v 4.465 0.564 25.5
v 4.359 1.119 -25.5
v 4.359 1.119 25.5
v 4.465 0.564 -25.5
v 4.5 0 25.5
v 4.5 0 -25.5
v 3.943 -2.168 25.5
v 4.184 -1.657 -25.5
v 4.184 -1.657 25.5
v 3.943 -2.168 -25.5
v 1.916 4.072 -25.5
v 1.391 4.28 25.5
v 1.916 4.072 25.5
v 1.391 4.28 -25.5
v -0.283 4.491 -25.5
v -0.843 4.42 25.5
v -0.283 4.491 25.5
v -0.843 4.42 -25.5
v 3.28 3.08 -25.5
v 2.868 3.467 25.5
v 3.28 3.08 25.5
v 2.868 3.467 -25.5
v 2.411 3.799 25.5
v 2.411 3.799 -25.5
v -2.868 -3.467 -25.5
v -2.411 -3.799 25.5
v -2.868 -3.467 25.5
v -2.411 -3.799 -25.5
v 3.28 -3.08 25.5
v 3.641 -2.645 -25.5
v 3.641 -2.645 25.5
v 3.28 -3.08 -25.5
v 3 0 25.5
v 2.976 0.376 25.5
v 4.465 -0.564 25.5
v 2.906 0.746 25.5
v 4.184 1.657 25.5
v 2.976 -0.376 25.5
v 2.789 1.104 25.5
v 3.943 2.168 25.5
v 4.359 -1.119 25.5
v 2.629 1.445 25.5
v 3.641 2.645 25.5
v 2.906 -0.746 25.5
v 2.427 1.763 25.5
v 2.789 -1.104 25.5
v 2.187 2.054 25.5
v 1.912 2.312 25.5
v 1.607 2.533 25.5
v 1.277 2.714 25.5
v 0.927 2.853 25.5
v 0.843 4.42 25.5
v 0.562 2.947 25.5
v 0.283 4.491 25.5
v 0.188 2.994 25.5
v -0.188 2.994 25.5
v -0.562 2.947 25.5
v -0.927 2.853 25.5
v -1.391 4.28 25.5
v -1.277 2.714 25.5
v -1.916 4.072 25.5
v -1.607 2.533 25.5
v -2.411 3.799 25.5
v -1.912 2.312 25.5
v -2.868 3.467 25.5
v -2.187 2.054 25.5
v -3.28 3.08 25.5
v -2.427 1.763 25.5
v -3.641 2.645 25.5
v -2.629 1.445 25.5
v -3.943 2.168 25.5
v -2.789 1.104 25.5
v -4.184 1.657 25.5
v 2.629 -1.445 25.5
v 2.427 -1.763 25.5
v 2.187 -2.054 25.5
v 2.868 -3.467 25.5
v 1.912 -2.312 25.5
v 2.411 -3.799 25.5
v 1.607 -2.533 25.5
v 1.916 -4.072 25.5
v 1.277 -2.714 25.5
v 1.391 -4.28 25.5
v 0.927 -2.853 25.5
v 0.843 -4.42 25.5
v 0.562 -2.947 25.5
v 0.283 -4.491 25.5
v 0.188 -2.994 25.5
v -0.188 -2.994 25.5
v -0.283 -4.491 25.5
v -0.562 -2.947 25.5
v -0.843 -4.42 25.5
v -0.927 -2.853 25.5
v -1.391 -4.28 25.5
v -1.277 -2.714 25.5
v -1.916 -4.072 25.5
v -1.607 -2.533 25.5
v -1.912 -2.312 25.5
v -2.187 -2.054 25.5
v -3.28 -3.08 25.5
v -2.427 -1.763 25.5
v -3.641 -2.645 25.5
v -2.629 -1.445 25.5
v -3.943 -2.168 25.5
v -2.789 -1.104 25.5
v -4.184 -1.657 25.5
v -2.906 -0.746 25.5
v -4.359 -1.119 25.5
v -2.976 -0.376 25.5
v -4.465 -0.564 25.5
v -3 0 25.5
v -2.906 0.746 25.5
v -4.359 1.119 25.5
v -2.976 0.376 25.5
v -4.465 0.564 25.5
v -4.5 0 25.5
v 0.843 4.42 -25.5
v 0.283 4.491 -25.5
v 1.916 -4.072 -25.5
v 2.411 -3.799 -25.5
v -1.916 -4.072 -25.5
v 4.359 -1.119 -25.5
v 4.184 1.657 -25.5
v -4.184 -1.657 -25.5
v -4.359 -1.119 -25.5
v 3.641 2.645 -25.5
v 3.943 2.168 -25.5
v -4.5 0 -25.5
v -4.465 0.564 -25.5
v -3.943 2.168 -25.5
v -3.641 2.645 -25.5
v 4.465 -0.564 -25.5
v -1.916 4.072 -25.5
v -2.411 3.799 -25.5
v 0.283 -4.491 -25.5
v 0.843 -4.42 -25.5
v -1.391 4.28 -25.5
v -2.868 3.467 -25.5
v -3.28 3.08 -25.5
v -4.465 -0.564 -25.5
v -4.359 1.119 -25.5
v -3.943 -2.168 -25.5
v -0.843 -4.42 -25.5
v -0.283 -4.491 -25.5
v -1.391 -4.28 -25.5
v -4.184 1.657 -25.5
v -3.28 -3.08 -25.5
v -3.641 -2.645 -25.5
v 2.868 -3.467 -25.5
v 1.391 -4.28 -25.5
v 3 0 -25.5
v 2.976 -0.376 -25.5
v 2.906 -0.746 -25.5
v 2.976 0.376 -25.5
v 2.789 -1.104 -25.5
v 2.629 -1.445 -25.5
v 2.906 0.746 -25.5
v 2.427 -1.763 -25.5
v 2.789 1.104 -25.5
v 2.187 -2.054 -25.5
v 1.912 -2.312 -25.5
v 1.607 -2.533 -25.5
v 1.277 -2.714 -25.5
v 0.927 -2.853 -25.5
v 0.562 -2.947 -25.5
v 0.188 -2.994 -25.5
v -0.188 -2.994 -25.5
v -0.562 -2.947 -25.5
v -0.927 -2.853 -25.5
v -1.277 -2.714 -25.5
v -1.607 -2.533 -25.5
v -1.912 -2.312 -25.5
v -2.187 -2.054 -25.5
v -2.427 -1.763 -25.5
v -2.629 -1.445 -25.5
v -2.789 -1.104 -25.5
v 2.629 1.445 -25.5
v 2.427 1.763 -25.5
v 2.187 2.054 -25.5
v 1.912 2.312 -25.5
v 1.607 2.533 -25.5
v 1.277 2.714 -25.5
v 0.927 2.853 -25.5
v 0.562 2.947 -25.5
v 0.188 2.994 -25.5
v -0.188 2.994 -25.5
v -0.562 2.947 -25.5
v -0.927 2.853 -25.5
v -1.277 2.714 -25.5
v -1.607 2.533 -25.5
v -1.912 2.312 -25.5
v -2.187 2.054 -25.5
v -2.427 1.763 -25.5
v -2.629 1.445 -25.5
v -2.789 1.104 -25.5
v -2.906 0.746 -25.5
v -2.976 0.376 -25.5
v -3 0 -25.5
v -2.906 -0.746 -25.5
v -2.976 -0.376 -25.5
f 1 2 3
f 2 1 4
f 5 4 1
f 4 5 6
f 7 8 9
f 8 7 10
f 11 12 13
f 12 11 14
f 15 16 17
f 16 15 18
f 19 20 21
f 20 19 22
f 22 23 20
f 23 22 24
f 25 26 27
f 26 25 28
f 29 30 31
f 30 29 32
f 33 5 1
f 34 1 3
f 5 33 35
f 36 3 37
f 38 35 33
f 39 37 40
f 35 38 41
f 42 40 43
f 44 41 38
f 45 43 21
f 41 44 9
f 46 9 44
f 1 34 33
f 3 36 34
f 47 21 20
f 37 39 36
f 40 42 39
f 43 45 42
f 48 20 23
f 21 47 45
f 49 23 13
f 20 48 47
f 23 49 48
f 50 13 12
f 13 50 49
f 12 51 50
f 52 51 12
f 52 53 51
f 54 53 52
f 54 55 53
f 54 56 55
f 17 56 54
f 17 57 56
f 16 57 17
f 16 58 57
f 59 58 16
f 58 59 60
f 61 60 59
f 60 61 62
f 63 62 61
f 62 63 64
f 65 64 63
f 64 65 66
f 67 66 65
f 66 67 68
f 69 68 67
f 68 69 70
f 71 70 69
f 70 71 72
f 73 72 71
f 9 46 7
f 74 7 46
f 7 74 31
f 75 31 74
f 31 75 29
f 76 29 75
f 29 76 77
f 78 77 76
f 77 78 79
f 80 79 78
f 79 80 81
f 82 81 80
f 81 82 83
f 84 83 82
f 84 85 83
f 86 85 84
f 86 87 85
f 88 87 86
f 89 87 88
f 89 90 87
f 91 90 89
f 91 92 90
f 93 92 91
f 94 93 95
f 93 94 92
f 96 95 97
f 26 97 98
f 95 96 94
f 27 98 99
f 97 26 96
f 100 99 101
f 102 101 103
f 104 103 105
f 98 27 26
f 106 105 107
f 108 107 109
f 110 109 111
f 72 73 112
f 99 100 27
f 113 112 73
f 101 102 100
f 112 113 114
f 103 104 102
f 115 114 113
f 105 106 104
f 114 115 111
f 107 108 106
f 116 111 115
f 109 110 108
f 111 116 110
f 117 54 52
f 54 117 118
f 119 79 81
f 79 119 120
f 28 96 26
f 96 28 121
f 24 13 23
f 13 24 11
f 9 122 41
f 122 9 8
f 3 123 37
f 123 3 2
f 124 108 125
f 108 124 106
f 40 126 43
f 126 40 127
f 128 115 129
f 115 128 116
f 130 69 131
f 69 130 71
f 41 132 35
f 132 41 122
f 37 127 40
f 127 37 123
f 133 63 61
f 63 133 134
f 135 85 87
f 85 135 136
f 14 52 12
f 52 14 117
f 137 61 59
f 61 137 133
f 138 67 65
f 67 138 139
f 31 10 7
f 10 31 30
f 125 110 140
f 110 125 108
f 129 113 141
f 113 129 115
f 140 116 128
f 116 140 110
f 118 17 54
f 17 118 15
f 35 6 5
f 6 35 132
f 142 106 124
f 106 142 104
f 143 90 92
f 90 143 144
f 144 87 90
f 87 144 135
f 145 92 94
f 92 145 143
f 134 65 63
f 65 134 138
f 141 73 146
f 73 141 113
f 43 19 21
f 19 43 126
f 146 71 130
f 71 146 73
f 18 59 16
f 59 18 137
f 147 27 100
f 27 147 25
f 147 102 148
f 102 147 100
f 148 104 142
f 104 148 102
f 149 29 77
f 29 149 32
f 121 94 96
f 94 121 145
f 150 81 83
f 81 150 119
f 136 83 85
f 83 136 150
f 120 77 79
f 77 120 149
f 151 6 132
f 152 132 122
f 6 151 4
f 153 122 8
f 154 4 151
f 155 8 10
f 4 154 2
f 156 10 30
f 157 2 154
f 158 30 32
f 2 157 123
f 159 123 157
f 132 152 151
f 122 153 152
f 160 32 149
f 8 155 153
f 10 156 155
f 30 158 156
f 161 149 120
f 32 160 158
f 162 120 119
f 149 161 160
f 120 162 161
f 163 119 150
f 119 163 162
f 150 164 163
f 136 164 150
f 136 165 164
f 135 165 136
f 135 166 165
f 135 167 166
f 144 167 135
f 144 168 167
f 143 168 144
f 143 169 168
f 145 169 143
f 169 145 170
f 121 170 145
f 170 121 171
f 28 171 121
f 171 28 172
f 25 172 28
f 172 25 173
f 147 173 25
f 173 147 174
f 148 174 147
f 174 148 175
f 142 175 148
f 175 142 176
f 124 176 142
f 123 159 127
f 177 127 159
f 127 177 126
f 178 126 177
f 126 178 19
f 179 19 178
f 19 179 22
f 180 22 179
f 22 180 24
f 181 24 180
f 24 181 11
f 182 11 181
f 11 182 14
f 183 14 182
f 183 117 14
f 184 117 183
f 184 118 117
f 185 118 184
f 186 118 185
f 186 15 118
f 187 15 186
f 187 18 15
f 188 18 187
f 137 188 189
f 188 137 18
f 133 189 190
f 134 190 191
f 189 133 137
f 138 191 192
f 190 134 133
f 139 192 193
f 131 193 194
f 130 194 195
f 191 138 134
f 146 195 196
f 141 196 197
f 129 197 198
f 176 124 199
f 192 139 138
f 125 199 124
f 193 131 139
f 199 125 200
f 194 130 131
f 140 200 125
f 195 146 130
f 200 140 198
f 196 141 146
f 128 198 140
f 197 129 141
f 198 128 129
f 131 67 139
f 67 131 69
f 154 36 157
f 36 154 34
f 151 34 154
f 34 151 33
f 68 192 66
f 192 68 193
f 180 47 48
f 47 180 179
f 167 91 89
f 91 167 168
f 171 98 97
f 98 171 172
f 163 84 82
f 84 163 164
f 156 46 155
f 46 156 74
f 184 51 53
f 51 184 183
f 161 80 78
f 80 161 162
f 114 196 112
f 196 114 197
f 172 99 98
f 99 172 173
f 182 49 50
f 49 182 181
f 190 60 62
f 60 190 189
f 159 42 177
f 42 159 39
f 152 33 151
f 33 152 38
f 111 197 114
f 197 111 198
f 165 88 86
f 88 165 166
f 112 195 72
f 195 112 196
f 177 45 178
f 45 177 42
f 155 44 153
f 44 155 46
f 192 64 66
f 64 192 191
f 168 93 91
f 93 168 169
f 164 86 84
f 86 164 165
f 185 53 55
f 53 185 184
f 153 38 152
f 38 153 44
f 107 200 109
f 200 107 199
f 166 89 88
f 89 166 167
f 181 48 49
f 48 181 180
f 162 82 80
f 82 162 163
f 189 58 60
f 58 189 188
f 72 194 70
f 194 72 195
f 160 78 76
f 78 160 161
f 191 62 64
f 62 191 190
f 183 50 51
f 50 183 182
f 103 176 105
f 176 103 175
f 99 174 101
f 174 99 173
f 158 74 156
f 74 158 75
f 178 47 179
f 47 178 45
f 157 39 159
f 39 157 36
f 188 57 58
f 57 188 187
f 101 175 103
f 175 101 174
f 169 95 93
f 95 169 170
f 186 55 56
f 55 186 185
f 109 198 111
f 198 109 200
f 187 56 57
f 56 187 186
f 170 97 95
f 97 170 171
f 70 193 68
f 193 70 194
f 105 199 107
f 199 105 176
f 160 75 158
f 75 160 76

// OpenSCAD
$fn = 50;


difference() {
	union() {
		translate(v = [0, 0, -25.5000000000]) {
			cylinder(h = 51, r = 4.5000000000);
		}
	}
	union() {
		translate(v = [0, 0, -100.0000000000]) {
			cylinder(h = 200, r = 3.0000000000);
		}
	}
}
